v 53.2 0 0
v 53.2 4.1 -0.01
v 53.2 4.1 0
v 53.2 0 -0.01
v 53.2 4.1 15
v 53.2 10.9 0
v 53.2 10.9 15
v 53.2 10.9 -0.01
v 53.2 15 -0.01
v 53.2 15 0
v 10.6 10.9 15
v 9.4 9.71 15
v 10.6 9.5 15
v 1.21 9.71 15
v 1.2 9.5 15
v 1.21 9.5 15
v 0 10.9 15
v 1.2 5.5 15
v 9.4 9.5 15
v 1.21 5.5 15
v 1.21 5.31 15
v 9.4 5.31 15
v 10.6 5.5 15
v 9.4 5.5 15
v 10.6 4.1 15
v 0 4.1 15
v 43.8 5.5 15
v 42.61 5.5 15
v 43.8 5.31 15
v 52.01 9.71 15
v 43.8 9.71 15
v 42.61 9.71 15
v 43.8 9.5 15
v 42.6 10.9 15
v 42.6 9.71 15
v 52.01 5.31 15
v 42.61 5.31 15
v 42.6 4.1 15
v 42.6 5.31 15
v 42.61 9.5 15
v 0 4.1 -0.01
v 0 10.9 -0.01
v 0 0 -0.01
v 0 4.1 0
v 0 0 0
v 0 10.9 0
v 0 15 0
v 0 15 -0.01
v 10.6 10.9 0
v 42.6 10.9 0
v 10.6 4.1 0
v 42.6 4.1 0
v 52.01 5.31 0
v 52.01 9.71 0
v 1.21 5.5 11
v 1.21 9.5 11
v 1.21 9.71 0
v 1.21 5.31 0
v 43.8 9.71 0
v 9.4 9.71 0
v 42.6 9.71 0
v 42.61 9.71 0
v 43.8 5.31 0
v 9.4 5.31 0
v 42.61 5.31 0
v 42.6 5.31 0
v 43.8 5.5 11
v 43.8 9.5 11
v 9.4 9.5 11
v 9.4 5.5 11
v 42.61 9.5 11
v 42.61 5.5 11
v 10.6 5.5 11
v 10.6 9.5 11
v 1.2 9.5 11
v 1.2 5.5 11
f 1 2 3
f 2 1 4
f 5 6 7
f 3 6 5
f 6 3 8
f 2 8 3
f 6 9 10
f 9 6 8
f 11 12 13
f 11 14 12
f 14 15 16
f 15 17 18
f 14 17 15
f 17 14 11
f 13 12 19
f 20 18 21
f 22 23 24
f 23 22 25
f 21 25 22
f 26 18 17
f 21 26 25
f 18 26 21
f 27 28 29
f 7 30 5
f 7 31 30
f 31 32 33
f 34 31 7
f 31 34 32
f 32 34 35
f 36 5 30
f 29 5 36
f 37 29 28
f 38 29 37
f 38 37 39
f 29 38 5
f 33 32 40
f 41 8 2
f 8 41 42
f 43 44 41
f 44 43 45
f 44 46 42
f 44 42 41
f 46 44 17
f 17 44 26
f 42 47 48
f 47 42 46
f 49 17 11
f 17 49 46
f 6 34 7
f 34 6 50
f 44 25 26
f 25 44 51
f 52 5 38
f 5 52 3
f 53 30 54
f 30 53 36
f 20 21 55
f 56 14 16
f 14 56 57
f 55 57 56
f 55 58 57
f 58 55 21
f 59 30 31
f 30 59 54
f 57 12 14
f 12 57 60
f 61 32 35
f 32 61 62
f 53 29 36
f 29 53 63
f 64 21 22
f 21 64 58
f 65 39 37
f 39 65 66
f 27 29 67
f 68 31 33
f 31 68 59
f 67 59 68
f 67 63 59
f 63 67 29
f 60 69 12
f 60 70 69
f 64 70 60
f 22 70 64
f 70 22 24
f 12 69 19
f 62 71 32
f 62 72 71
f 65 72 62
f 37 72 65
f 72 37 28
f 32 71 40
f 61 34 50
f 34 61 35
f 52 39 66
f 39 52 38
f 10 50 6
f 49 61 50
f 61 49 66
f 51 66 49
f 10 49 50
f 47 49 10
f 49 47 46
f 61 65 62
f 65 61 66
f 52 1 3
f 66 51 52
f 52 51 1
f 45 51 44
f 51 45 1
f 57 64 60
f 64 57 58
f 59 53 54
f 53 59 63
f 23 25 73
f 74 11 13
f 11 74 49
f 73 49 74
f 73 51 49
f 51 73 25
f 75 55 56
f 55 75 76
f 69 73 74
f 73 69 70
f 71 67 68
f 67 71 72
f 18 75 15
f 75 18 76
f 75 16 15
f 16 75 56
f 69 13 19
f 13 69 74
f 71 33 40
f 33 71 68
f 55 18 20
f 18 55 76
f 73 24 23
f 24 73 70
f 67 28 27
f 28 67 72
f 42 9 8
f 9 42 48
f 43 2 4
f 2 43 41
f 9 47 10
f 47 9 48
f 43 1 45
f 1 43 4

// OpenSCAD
// file: ../Base/PlacementOptions.scad
// Fischertechnik Box Foundation
// Placement Options

// Alignment
NoAlign = 0;
AlignLeft = 1;
AlignBottom = 2;
AlignCenter = 3;
AlignRight = 4;
AlignTop = 5;

// Element rotation degree steps
rotations = [0, -90, -180, -270];

// Rotation
NoRotation = 0;
Rotate0 = 0;
Rotate90 = 1;
Rotate180 = 2;
Rotate270 = 3;

// Docking (seen from above)
NoDock = -1;
DockLeft = 0;
DockTop = 1;
DockRight = 2;
DockCorner = 2;
DockBottom = 3;

// Web corners
LowerLeft = 0;
UpperLeft = 1;
UpperRight = 2;
LowerRight = 3;

// Web position relative to corner
LeftOfCorner = 0;
RightOfCorner = 1;
// file: ../Base/Boxes.scad
// Fischertechnik Box Foundation
// Pre-designed Boxes

use <Constants.scad>

include <PlacementOptions.scad>

box190Width = 190;
box190Depth = 130;
box130Width = 130;
box130Depth = 95;

// Values are from an original ec3 box
topBottomDifference = 1.5;
outerHeight = 40;
baseThickness = 1.8;
innerHeight = outerHeight - baseThickness;
stackExcess = 5.7;
radius = 3.5;
wallThickness = 1.5;
tolerance = 0.2;

boxWallThickness = wallThickness;
boxBaseThickness = baseThickness;
boxWebWidth = 3.0;

// getBoxWallThickness()
// Gets the wall thickness of a Fischertechnik Box
function getBoxWallThickness() = boxWallThickness;

// getBoxUsageHeight(height = 38.2)
// Gets the usable height of a Fischertechnik box
// height = Outer height of the box from the bottom to the upper edge.
function getBoxUsageHeight(height = outerHeight) = height - baseThickness - stackExcess;

// getBoxInnerHeight()
// Gets the inner height of a Fischertechnik box, including the stack excess
function getBoxInnerHeight() = innerHeight;

// getBoxBaseThickness()
// Gets the thickness of the Fischertechnik box base.
function getBoxBaseThickness() = boxBaseThickness;

// getBoxWebWidth()
// Gets the width of a box web
function getBoxWebWidth() = boxWebWidth;

// getBox190Space()
// Gets the usable inner space of a Box 190 as an x/y-list
function getBox190Space() = [
    box190Width - 2*getBoxWallThickness() - topBottomDifference, 
    box190Depth - 2*getBoxWallThickness() - topBottomDifference ];

// RoundedCornerPlate(width, depth, height, radius)
// Creates a body plate with rounded corners for a box. Used
// also to create the complete box with the hull module.
// width = Width of the plate
// depth = depth of the plate 
// height = thickness of the plate
// radius = radius of the rounded corner
module RoundedCornerPlate(width, depth, height, radius) {
    translate([radius, radius])
    hull() {
        w = width-2*radius;
        d = depth-2*radius;
        cube([w, d, height]);
        cylinder(height, r=radius, $fn=getFragments());
        translate([w, 0])
            cylinder(height, r=radius, $fn=getFragments());
        translate([w, d])
            cylinder(height, r=radius, $fn=getFragments());
        translate([0, d])
            cylinder(height, r=radius, $fn=getFragments());
    }
}

// BoxBase(width, depth)
// Creates an empty stackable Fischertechnik compatible box
// width = Outer width of the box (190, 130, ...)
// depth = Outer depth of the box (130, 95, ...)

module BoxBase(width, depth, height=outerHeight) {    
    thinPlate = 0.01;

    innerHeight = height - baseThickness;    
    
    module Body(tolerance=tolerance) {
        hull() {
            // Bottom with tolerance to fit into the original boxes when stacked
            translate([-wallThickness+tolerance, -wallThickness+tolerance, -baseThickness])
                RoundedCornerPlate(width-topBottomDifference-2*tolerance, depth-topBottomDifference-2*tolerance, thinPlate, radius);
            
            // Top
            translate([-wallThickness-topBottomDifference/2, -wallThickness-topBottomDifference/2, innerHeight-thinPlate])
                RoundedCornerPlate(width, depth, thinPlate, radius);
         }
    }

    module Cutoff() {
        hull() {
            coWidth = width - 2*wallThickness;
            coDepth = depth - 2*wallThickness;
            
            // Bottom
            RoundedCornerPlate(coWidth-topBottomDifference, coDepth-topBottomDifference, thinPlate, radius);

            // Top
            translate([-topBottomDifference/2, -topBottomDifference/2, innerHeight+thinPlate]) 
                RoundedCornerPlate(coWidth, coDepth, thinPlate, radius);
        }
    }
    
    difference() {        
        Body();
        Cutoff();
        stackOffset = innerHeight - stackExcess;
        translate([0, 0, stackOffset + baseThickness])
            Body(tolerance=0);
    }
}

// Creates the Fischertechnik empty box 130x190 mm and places it at position 0,0
// 190x130 are the outer sizes, the inner space is slightly smaller. Use getBox190Space() to get the inner sizes.
// The box is positioned that the usable inner space is at the 0,0,0 position.

module Box190() {
    BoxBase(box190Width, box190Depth);
}

// Gets the usable inner space of a Box 130 as an x/y-list
function getBox130Space() = [
    box130Width - 2*getBoxWallThickness() - topBottomDifference, 
    box130Depth - 2*getBoxWallThickness() - topBottomDifference ];

// Creates the Fischertechnik empty box 95x130 mm and places it at position 0,0
// 190x130 are the outer sizes, the inner space is slightly smaller. Use getBox190Space() to get the inner sizes.
// The box is positioned that the usable inner space is at the 0,0,0 position.

module Box130() {
    BoxBase(box130Width, box130Depth);
}

// Creates a web at the specified box walls
// corner 0 = LowerLeft, 1 = UpperLeft, 2 = UpperRight, 3 = LowerRight
// side 0 = LeftOfCorner, 1 = RightOfCorner
// distance = Distance in mm from the corner
// boxSpace = inner width and depth of the box (default: Box 190)
// webWidth = length of the web (default is 3 mms)
// webThickness = thickness of the web (default is 1 mm)
// height = Height of the web (standard is getBoxUsageHeight())

module BoxWeb(corner, side, distance, boxSpace=getBox190Space(), webWidth=getBoxWebWidth(), webThickness=1.0, height=getBoxUsageHeight()) {
    sink = getBoxWallThickness()/2;

    width = (corner % 2 == 0) ? 
            (side == LeftOfCorner ? webWidth : webThickness) :
            (side == LeftOfCorner ? webThickness : webWidth);

    depth = (corner % 2 == 0) ? 
            (side == RightOfCorner ? webWidth : webThickness) :
            (side == RightOfCorner ? webThickness : webWidth);
    
    xDiff = corner == LowerLeft ? 
                (side == LeftOfCorner ? -sink : distance) :
            (corner == UpperLeft ?                
                (side == LeftOfCorner ? distance : -sink) :
            (corner == UpperRight ?
                (side == LeftOfCorner ? boxSpace.x-webWidth+sink : boxSpace.x-distance-webThickness) :
                (side == LeftOfCorner ? boxSpace.x-distance-webThickness: boxSpace.x-webWidth+sink)));

    yDiff = corner == LowerLeft ? 
                (side == RightOfCorner ? -sink : distance) :
            (corner == UpperLeft ?
                (side == RightOfCorner ? boxSpace.y-distance-webThickness : boxSpace.y-webWidth+sink) :
            (corner == UpperRight ?
                (side == RightOfCorner ? boxSpace.y-webWidth+sink : boxSpace.y-distance-webThickness) :
                (side == RightOfCorner ? distance : -sink)));
    
    translate([xDiff, yDiff, -getExcess()])
        cube([width, depth, height + 2*getExcess()]);
}
// file: ../Base/Rotation.scad
// Fischertechnik Box Foundation
// Geometry Helpers Rotation

include <PlacementOptions.scad>

// getRotatedSpace(space, rotation=NoRotation)
// Rotates the space dependent on the specified rotation

function getRotatedSpace(space, rotation=NoRotation) = [
    (rotation == Rotate90 || rotation == Rotate270) ? space.y : space.x,
    (rotation == Rotate90 || rotation == Rotate270) ? space.x : space.y
];

// Rotates the given space around the fixed left lower corner
// space = the space the children needs as width/depth list [width,depth]
// rotation = 0 Rotate0 degrees, 1 Rotate90 degrees, 2 Rotate180 degrees, 3 Rotate270 degrees (equivalent to -90)

module RotateFix(space, rotation=NoRotation) {
    dy = (rotation == Rotate0 || rotation == Rotate270) ? 0 :
        (rotation == Rotate90) ? space.x :
        space.y;
    dx = (rotation < Rotate180) ? 0 :
        (rotation == Rotate180) ? space.x :
        space.y;
    
    translate([dx, dy, 0])
        rotate([0, 0, rotations[rotation]])
            children();
}
// file: ../Base/Alignment.scad
// Fischertechnik Box Foundation
// Geometry Helpers Alignment

include <PlacementOptions.scad>

// getAlignedX(elementWidth, spaceWidth, align=AlignRight, offset=0)
// Gets the aligned X offset of an element with the given
// width in the given space.
// elementWidth = The width of the element to positon
// spaceWidth = The space where the element should be aligned
// align = 0 AlignLeft, 1 AlignCenter, 2 AlignRight
// offset = an optional offset from the aligned position. When
// aligned left or centered, then positive values are in X direction.
// When aligned right then positive values are in negative X direction.

function getAlignedX(elementWidth, spaceWidth, align=AlignRight, offset=0) =
    (align == AlignLeft) ?
        offset :
        ((align == AlignCenter) ?
        (spaceWidth - elementWidth)/2 + offset :
        spaceWidth - offset - elementWidth);

// getAlignedY(elementDepth, spaceDepth, align=AlignTop, offset=0)
// Gets the aligned Y offset of an element with the given
// depth in the given space.
// elementDepth = The depth of the element to positon
// spaceDepth = The space where the element should be aligned
// align = 0 AlignBottom, 1 AlignCenter, 2 AlignTop
// offset = an optional offset from the aligned position. When
// aligned bottom or centered, then positive values are in Y direction.
// When aligned top then positive values are in negative Y direction.

function getAlignedY(elementDepth, spaceDepth, align=AlignTop, offset=0) =
    (align == AlignBottom) ?
        offset :
        ((align == AlignCenter) ?
        (spaceDepth - elementDepth)/2 + offset :
        spaceDepth - offset - elementDepth);
// file: ../Base/Constants.scad
// Fischertechnik Box Foundation
// Constants

// Constant values necessary for multiple elements

// Base constants
dividerThickness = 1.2;
excess = 0.01;
fragments = 90;
tolerance = 0.8;

// Gets the thickness of a divider 
function getDividerThickness() = dividerThickness;

// Gets the excess that is used to merge walls into each other
function getExcess() = excess;

// Gets amount of fragments of a cylinder
function getFragments() = fragments;

// Gets the inner tolerance of a frame to each side
function getTolerance() = tolerance;


// Fischertechnik specific constants
axisDiameter = 4;
axisBottomDiameter = axisDiameter + 1;
axisTolerance = 0.2;

// Gets axis diameter of Fischertechnik axis
function getAxisDiameter() = axisDiameter;

// Gets axis diameter tolerance (subtracted for element axis)
function getAxisTolerance() = axisTolerance;

// Gets the axis diameter for standing axis
function getStandAxisDiameter() = getAxisDiameter() - getAxisTolerance();

// Gets axis bottom diameter for thicker part at the bottom
function getAxisBottomDiameter() = axisBottomDiameter;

standardEdgeDistance = 2.5;
standardWebDistance = 11.5;
standardCornerLength = 15;

// gets the standard distance to the wall of the box for dockable frames with webs
function getStandardEdgeDistance() = standardEdgeDistance;

// gets the standard distance of each web to the corner of the dockable frame
function getStandardWebDistance() = standardWebDistance;

// gets the standard length of the corner walls of a dockable frame
function getStandardCornerLength() = standardCornerLength;

tubeWallFactor = 0.8;

// gets the wall thickness of a tube.
function getTubeWallThickness() = tubeWallFactor * getDividerThickness();

smallPartsFrameHeight = 20;

// gets the frame height for docked small parts boxes.
function getSmallPartsFrameHeight() = smallPartsFrameHeight;

hubRingDiameter = 19.5;
hubRingLevelDiameter = 21;

// gets the diameter of a tube matching the inner ring of a wheel
function getHubRingDiameter() = hubRingDiameter;

// gets the diameter of a hub tube with a thicker diameter
function getHubRingLevelDiameter() = hubRingLevelDiameter;
// file: FrameAxis50.scad
// Fischertechnik Box Library
// Frame for single 50 mm Axis
// 31033

use <../ModelBase/Complex.scad>

length = 50;

// getFrameAxis50Space()
// Gets the width (.x) and depth (.y) of the axis frame.

function getFrameAxis50Space() = getFrameAxisSpace(length);

// FrameAxis50()
// Axis holder for a single 50 mm axis.

module FrameAxis50() {
    FrameAxis(length);
}

// Test
color("lightgray")
FrameAxis50();
// file: ../Base/Placement.scad
// Fischertechnik Box Foundation
// Geometry Helpers Placement

use <Constants.scad>
use <Alignment.scad>
use <Rotation.scad>
use <Boxes.scad>

include <PlacementOptions.scad>

// Place(x=0, y=0, elementSpace=[0,0], alignX=AlignLeft, alignY=AlignBottom, rotation=Rotate0, boxSpace=getBox190Space())
// Places the child at the specified position
// y = Y-Position. This is a relative position when an X aligment is specified.
// x = X-Position. This is a relative position when an Y aligment is specified.
// elementSpace = space of the element to be placed [x,y]
// alignX = -1=NoAlign, 0 AlignLeft, 1 AlignCenter, 3 AlignRight (elementSpace and boxSpace required!)
// alignY = -1=NoAlign, 2 AlignBottom, 1 AlignCenter, 4 AlignTop (elementSpace and boxSpace required!)
// rotation = 0 Rotate0 0 degrees, 1 Rotate90 90 degrees, 
// 2 Rotate180 180 degrees, 3 Rotate270 270 degrees (equivalent to -90)
// boxSpace = Inner space of the box where the placement occurs [x,y] - default is Box 190x130 inner space

module Place(x=0, y=0, elementSpace=[0,0], 
  alignX=AlignLeft, alignY=AlignBottom, 
  rotation=NoRotation, boxSpace=getBox190Space()) {

    module Position(x, y, space, rotation=Rotate0) {
        translate([x, y, 0])
            RotateFix(space, rotation)
                children();
    }

    space = getRotatedSpace(elementSpace, rotation);
    alignedX = getAlignedX(space.x, boxSpace.x, alignX, x);
    alignedY = getAlignedY(space.y, boxSpace.y, alignY, y);
    Position(alignedX, alignedY, elementSpace, rotation)
        children();
}

// Center(space=getBox130Space(), elementSpace=[0,0])
// space = Space where the children is centered. For cylinder use centered=true and no elementSpace.
// elementSpace = space of the element to be centered [x,y]

module Center(space=getBox190Space(), elementSpace=[0,0]) {
    Place(elementSpace=elementSpace, boxSpace=space, alignX=AlignCenter, alignY=AlignCenter)
        children();
}

// CenterHorizontal(width=0, y=0, offset=0, space=getBox130Space())
// width = Width of the element to be placed.
// y = Y position of the element
// offset = Offset from the center position (negative will be left of the center)
// space = Space where the element is placed

module CenterHorizontal(width=0, y=0, offset=0, space=getBox190Space()) {
    Place(x=offset, y=y, elementSpace=[width, 0], boxSpace=space, alignX=AlignCenter)
        children(0);
}

// CenterVertical(depth=0, x=0, offset=0, space=getBox130Space())
// depth = Depth of the element to be placed.
// x = X position of the element
// offset = Offset from the center position (negative will be down of the center)
// space = Space where the element is placed

module CenterVertical(depth=0, x=0, offset=0, space=getBox190Space()) {
    Place(x=x, y=offset, elementSpace=[0, depth], boxSpace=space, alignY=AlignCenter)
        children(0);
}

// getIsVertical(align)
// True if the specified alignment needs a vertical orientation for a divider (AlignRight, AlignLeft)

function getIsVertical(align) = (align == AlignRight || align == AlignLeft);

// getIsHorizontal(align)
// True if the specified alignment needs a horizontal orientation for a divider (AlignTop, AlignBottom)

function getIsHorizontal(align) = (align == AlignTop || align == AlignBottom);
// main file
// Fischertechnik Box Library
// Frame for 50 mm Axis with gear wheel 28
// 185849

use <../Base/Placement.scad>
use <../ModelBase/Simple.scad>
use <FrameAxis50.scad>

/* [Hidden] */
depth = 15;

// getFrameAxis50WithGearwheelZ28Space()
// Gets the width (.x) and depth (.y) of the axis frame.

function getFrameAxis50WithGearwheelZ28Space() = 
[
    getFrameAxis50Space().x,
    depth
];

// FrameAxis50WithGearwheelZ28()
// Axis holder for a 50 mm axis with gear wheel Z28.

module FrameAxis50WithGearwheelZ28() {
    Space(getFrameAxis50WithGearwheelZ28Space());
    CenterVertical(depth=getFrameAxis50Space().y, space=getFrameAxis50WithGearwheelZ28Space())
        FrameAxis50();
}

// Test
color("lightgray")
FrameAxis50WithGearwheelZ28();
